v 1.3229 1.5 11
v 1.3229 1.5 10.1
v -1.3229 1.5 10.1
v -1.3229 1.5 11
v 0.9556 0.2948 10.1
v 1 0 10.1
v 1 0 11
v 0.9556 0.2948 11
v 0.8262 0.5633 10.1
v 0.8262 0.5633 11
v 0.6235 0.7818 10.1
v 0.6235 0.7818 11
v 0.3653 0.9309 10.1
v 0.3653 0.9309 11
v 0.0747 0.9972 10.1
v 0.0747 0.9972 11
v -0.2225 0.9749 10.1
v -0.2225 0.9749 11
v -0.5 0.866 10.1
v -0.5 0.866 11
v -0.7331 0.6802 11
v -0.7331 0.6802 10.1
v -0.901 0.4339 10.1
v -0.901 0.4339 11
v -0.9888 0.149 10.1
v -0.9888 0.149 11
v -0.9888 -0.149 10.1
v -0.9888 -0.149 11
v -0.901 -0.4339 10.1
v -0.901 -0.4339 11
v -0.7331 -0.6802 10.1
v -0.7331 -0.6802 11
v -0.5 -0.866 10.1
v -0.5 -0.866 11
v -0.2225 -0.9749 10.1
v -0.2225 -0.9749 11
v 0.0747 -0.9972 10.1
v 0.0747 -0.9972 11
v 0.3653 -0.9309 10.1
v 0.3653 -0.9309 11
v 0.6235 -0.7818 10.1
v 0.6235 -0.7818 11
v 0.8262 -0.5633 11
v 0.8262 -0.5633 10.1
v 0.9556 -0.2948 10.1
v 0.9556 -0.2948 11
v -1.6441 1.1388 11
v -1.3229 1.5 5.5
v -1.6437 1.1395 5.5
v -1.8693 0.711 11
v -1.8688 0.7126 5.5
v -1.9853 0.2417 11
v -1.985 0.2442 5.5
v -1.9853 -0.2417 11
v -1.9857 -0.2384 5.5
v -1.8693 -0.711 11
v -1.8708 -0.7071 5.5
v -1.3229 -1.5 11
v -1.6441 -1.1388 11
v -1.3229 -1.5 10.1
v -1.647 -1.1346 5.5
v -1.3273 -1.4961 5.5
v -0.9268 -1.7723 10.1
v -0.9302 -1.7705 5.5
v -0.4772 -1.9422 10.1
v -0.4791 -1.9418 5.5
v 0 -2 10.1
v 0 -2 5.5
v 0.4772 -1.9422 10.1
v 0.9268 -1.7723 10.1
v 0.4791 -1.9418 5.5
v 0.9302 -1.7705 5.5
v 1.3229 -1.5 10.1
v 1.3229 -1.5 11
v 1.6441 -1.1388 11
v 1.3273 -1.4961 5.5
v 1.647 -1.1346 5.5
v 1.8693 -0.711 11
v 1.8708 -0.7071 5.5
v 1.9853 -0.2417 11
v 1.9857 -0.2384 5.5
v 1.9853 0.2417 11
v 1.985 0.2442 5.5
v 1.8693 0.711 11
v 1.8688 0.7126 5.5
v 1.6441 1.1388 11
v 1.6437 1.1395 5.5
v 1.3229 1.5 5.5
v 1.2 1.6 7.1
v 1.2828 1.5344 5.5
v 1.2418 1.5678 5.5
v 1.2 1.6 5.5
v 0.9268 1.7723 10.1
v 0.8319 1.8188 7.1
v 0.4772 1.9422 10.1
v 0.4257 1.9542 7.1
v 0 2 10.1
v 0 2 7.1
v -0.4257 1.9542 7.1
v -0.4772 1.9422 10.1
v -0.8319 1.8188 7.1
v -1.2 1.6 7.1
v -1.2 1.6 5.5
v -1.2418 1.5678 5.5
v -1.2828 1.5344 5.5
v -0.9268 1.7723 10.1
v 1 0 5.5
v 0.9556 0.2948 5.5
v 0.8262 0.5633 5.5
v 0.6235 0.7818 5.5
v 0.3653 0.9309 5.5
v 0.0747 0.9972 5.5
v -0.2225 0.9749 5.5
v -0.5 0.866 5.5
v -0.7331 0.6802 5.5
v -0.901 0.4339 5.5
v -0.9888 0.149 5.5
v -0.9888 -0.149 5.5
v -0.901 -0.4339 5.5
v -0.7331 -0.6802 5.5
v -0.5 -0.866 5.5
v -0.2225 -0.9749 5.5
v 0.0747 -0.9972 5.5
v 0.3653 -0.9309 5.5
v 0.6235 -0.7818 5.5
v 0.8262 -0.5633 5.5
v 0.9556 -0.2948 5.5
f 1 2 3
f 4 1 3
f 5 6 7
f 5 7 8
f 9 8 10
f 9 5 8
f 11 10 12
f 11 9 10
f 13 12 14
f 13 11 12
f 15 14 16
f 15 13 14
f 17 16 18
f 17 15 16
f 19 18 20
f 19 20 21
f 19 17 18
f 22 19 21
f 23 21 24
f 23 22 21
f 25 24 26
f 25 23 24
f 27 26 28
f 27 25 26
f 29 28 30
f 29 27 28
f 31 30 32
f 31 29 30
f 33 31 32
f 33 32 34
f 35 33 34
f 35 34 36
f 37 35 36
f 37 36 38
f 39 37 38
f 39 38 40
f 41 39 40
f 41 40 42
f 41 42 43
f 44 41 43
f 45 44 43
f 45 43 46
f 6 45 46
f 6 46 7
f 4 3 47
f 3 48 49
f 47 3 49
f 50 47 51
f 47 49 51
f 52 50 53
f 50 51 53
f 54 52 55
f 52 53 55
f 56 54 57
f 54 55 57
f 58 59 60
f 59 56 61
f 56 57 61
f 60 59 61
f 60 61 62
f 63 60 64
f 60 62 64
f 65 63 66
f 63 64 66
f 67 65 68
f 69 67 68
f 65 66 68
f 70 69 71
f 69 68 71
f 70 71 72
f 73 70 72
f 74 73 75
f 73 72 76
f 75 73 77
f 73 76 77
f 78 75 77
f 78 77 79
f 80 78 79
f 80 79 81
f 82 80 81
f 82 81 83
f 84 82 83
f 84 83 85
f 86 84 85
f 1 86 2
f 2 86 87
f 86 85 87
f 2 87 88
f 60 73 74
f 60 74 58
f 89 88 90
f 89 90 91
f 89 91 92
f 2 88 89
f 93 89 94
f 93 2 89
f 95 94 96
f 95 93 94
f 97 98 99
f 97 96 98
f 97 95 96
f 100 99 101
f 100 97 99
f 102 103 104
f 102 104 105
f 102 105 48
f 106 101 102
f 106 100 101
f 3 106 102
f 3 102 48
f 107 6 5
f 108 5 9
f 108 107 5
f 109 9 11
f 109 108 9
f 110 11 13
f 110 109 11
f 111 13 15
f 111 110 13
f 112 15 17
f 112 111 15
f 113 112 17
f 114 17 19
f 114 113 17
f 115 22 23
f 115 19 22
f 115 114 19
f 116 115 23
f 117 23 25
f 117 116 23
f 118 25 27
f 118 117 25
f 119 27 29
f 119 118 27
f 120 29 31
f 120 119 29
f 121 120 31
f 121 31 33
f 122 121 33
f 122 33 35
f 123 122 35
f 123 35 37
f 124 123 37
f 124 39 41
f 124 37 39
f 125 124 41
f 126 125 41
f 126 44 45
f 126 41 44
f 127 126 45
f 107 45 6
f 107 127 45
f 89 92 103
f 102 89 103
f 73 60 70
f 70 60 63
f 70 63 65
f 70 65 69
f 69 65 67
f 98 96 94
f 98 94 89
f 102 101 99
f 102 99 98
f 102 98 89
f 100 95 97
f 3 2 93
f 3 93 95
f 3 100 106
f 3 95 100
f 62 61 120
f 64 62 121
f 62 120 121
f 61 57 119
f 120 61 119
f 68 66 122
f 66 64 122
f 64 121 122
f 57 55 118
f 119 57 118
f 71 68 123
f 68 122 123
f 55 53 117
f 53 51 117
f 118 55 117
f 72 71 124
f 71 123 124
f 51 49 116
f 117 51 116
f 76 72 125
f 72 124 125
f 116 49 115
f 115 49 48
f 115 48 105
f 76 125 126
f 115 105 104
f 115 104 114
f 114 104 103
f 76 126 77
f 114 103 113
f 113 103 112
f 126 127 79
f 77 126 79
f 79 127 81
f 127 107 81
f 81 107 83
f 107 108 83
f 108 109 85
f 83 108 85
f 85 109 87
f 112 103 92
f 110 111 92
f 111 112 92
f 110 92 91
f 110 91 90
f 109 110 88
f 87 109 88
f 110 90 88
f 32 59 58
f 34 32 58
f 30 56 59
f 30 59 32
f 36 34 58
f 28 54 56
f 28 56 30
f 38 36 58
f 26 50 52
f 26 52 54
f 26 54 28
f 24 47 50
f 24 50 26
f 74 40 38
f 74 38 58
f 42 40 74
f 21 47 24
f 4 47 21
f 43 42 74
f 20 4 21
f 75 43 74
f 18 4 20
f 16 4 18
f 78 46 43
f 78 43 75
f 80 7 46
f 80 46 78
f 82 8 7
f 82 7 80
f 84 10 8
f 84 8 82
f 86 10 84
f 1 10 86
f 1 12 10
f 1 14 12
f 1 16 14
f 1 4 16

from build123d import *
from build123d.topology import SkipClean

# Parameters (mm, degrees)
SKETCH3_R           = 1
BOSS_EXTRUDE1_DEPTH = 11
SKETCH4_R           = 2
BOSS_EXTRUDE2_DEPTH = 4.6
SKETCH8_R           = 1
CUT_EXTRUDE2_DEPTH  = 7.184658438
CUT_EXTRUDE5_START  = -0.9
CUT_EXTRUDE5_DEPTH  = 0.9
CUT_EXTRUDE6_DEPTH  = 1.6


with BuildPart() as part:
    # Sketch3 → Boss-Extrude1 (new body)
    with BuildSketch(Plane.XY):
        with BuildLine():
            Line((1.322875656, 1.5), (-1.322875656, 1.5))
            ThreePointArc((-1.322875656, 1.5), (0, -2), (1.322875656, 1.5))
        make_face()
        Circle(SKETCH3_R, mode=Mode.SUBTRACT)
    extrude(amount=BOSS_EXTRUDE1_DEPTH)

    # Sketch4 → Boss-Extrude2 (add, symmetric)
    with BuildSketch(Plane.XY.offset(5.5)):
        with Locations(Location((0, 0, 0), (0, 0, 131.409622109))):
            Circle(SKETCH4_R)
    extrude(amount=BOSS_EXTRUDE2_DEPTH, both=True)

    # Split1
    split(bisect_by=Plane.XY.offset(5.5), keep=Keep.TOP)

    # Sketch8 → Cut-Extrude2 (cut, through all)
    with SkipClean():  # the faces are left unmerged after this step: merging them gives an invalid solid
        with BuildSketch(Plane.XY.offset(5.5)):
            Circle(SKETCH8_R)
        extrude(amount=CUT_EXTRUDE2_DEPTH, mode=Mode.SUBTRACT)

    # Sketch9 → Cut-Extrude5 (cut)
    with SkipClean():  # the faces are left unmerged after this step: merging them gives an invalid solid
        with BuildSketch(Plane.XY.offset(11).offset(CUT_EXTRUDE5_START)):
            with BuildLine():
                Line((1.322875656, -1.5), (-1.322875656, -1.5))
                ThreePointArc((-1.322875656, -1.5), (0, -2), (1.322875656, -1.5))
            make_face()
        extrude(amount=CUT_EXTRUDE5_DEPTH, mode=Mode.SUBTRACT)

    # Sketch12 → Cut-Extrude6 (cut)
    with SkipClean():  # the faces are left unmerged after this step: merging them gives an invalid solid
        with BuildSketch(Plane(origin=(0, 0, 5.5), x_dir=(-1, 0, 0), z_dir=(0, 0, -1))):
            with BuildLine():
                Line((-1.2, 1.6), (1.2, 1.6))
                ThreePointArc((1.2, 1.6), (0, 2), (-1.2, 1.6))
            make_face()
        extrude(amount=-CUT_EXTRUDE6_DEPTH, mode=Mode.SUBTRACT)


solid = part.part
